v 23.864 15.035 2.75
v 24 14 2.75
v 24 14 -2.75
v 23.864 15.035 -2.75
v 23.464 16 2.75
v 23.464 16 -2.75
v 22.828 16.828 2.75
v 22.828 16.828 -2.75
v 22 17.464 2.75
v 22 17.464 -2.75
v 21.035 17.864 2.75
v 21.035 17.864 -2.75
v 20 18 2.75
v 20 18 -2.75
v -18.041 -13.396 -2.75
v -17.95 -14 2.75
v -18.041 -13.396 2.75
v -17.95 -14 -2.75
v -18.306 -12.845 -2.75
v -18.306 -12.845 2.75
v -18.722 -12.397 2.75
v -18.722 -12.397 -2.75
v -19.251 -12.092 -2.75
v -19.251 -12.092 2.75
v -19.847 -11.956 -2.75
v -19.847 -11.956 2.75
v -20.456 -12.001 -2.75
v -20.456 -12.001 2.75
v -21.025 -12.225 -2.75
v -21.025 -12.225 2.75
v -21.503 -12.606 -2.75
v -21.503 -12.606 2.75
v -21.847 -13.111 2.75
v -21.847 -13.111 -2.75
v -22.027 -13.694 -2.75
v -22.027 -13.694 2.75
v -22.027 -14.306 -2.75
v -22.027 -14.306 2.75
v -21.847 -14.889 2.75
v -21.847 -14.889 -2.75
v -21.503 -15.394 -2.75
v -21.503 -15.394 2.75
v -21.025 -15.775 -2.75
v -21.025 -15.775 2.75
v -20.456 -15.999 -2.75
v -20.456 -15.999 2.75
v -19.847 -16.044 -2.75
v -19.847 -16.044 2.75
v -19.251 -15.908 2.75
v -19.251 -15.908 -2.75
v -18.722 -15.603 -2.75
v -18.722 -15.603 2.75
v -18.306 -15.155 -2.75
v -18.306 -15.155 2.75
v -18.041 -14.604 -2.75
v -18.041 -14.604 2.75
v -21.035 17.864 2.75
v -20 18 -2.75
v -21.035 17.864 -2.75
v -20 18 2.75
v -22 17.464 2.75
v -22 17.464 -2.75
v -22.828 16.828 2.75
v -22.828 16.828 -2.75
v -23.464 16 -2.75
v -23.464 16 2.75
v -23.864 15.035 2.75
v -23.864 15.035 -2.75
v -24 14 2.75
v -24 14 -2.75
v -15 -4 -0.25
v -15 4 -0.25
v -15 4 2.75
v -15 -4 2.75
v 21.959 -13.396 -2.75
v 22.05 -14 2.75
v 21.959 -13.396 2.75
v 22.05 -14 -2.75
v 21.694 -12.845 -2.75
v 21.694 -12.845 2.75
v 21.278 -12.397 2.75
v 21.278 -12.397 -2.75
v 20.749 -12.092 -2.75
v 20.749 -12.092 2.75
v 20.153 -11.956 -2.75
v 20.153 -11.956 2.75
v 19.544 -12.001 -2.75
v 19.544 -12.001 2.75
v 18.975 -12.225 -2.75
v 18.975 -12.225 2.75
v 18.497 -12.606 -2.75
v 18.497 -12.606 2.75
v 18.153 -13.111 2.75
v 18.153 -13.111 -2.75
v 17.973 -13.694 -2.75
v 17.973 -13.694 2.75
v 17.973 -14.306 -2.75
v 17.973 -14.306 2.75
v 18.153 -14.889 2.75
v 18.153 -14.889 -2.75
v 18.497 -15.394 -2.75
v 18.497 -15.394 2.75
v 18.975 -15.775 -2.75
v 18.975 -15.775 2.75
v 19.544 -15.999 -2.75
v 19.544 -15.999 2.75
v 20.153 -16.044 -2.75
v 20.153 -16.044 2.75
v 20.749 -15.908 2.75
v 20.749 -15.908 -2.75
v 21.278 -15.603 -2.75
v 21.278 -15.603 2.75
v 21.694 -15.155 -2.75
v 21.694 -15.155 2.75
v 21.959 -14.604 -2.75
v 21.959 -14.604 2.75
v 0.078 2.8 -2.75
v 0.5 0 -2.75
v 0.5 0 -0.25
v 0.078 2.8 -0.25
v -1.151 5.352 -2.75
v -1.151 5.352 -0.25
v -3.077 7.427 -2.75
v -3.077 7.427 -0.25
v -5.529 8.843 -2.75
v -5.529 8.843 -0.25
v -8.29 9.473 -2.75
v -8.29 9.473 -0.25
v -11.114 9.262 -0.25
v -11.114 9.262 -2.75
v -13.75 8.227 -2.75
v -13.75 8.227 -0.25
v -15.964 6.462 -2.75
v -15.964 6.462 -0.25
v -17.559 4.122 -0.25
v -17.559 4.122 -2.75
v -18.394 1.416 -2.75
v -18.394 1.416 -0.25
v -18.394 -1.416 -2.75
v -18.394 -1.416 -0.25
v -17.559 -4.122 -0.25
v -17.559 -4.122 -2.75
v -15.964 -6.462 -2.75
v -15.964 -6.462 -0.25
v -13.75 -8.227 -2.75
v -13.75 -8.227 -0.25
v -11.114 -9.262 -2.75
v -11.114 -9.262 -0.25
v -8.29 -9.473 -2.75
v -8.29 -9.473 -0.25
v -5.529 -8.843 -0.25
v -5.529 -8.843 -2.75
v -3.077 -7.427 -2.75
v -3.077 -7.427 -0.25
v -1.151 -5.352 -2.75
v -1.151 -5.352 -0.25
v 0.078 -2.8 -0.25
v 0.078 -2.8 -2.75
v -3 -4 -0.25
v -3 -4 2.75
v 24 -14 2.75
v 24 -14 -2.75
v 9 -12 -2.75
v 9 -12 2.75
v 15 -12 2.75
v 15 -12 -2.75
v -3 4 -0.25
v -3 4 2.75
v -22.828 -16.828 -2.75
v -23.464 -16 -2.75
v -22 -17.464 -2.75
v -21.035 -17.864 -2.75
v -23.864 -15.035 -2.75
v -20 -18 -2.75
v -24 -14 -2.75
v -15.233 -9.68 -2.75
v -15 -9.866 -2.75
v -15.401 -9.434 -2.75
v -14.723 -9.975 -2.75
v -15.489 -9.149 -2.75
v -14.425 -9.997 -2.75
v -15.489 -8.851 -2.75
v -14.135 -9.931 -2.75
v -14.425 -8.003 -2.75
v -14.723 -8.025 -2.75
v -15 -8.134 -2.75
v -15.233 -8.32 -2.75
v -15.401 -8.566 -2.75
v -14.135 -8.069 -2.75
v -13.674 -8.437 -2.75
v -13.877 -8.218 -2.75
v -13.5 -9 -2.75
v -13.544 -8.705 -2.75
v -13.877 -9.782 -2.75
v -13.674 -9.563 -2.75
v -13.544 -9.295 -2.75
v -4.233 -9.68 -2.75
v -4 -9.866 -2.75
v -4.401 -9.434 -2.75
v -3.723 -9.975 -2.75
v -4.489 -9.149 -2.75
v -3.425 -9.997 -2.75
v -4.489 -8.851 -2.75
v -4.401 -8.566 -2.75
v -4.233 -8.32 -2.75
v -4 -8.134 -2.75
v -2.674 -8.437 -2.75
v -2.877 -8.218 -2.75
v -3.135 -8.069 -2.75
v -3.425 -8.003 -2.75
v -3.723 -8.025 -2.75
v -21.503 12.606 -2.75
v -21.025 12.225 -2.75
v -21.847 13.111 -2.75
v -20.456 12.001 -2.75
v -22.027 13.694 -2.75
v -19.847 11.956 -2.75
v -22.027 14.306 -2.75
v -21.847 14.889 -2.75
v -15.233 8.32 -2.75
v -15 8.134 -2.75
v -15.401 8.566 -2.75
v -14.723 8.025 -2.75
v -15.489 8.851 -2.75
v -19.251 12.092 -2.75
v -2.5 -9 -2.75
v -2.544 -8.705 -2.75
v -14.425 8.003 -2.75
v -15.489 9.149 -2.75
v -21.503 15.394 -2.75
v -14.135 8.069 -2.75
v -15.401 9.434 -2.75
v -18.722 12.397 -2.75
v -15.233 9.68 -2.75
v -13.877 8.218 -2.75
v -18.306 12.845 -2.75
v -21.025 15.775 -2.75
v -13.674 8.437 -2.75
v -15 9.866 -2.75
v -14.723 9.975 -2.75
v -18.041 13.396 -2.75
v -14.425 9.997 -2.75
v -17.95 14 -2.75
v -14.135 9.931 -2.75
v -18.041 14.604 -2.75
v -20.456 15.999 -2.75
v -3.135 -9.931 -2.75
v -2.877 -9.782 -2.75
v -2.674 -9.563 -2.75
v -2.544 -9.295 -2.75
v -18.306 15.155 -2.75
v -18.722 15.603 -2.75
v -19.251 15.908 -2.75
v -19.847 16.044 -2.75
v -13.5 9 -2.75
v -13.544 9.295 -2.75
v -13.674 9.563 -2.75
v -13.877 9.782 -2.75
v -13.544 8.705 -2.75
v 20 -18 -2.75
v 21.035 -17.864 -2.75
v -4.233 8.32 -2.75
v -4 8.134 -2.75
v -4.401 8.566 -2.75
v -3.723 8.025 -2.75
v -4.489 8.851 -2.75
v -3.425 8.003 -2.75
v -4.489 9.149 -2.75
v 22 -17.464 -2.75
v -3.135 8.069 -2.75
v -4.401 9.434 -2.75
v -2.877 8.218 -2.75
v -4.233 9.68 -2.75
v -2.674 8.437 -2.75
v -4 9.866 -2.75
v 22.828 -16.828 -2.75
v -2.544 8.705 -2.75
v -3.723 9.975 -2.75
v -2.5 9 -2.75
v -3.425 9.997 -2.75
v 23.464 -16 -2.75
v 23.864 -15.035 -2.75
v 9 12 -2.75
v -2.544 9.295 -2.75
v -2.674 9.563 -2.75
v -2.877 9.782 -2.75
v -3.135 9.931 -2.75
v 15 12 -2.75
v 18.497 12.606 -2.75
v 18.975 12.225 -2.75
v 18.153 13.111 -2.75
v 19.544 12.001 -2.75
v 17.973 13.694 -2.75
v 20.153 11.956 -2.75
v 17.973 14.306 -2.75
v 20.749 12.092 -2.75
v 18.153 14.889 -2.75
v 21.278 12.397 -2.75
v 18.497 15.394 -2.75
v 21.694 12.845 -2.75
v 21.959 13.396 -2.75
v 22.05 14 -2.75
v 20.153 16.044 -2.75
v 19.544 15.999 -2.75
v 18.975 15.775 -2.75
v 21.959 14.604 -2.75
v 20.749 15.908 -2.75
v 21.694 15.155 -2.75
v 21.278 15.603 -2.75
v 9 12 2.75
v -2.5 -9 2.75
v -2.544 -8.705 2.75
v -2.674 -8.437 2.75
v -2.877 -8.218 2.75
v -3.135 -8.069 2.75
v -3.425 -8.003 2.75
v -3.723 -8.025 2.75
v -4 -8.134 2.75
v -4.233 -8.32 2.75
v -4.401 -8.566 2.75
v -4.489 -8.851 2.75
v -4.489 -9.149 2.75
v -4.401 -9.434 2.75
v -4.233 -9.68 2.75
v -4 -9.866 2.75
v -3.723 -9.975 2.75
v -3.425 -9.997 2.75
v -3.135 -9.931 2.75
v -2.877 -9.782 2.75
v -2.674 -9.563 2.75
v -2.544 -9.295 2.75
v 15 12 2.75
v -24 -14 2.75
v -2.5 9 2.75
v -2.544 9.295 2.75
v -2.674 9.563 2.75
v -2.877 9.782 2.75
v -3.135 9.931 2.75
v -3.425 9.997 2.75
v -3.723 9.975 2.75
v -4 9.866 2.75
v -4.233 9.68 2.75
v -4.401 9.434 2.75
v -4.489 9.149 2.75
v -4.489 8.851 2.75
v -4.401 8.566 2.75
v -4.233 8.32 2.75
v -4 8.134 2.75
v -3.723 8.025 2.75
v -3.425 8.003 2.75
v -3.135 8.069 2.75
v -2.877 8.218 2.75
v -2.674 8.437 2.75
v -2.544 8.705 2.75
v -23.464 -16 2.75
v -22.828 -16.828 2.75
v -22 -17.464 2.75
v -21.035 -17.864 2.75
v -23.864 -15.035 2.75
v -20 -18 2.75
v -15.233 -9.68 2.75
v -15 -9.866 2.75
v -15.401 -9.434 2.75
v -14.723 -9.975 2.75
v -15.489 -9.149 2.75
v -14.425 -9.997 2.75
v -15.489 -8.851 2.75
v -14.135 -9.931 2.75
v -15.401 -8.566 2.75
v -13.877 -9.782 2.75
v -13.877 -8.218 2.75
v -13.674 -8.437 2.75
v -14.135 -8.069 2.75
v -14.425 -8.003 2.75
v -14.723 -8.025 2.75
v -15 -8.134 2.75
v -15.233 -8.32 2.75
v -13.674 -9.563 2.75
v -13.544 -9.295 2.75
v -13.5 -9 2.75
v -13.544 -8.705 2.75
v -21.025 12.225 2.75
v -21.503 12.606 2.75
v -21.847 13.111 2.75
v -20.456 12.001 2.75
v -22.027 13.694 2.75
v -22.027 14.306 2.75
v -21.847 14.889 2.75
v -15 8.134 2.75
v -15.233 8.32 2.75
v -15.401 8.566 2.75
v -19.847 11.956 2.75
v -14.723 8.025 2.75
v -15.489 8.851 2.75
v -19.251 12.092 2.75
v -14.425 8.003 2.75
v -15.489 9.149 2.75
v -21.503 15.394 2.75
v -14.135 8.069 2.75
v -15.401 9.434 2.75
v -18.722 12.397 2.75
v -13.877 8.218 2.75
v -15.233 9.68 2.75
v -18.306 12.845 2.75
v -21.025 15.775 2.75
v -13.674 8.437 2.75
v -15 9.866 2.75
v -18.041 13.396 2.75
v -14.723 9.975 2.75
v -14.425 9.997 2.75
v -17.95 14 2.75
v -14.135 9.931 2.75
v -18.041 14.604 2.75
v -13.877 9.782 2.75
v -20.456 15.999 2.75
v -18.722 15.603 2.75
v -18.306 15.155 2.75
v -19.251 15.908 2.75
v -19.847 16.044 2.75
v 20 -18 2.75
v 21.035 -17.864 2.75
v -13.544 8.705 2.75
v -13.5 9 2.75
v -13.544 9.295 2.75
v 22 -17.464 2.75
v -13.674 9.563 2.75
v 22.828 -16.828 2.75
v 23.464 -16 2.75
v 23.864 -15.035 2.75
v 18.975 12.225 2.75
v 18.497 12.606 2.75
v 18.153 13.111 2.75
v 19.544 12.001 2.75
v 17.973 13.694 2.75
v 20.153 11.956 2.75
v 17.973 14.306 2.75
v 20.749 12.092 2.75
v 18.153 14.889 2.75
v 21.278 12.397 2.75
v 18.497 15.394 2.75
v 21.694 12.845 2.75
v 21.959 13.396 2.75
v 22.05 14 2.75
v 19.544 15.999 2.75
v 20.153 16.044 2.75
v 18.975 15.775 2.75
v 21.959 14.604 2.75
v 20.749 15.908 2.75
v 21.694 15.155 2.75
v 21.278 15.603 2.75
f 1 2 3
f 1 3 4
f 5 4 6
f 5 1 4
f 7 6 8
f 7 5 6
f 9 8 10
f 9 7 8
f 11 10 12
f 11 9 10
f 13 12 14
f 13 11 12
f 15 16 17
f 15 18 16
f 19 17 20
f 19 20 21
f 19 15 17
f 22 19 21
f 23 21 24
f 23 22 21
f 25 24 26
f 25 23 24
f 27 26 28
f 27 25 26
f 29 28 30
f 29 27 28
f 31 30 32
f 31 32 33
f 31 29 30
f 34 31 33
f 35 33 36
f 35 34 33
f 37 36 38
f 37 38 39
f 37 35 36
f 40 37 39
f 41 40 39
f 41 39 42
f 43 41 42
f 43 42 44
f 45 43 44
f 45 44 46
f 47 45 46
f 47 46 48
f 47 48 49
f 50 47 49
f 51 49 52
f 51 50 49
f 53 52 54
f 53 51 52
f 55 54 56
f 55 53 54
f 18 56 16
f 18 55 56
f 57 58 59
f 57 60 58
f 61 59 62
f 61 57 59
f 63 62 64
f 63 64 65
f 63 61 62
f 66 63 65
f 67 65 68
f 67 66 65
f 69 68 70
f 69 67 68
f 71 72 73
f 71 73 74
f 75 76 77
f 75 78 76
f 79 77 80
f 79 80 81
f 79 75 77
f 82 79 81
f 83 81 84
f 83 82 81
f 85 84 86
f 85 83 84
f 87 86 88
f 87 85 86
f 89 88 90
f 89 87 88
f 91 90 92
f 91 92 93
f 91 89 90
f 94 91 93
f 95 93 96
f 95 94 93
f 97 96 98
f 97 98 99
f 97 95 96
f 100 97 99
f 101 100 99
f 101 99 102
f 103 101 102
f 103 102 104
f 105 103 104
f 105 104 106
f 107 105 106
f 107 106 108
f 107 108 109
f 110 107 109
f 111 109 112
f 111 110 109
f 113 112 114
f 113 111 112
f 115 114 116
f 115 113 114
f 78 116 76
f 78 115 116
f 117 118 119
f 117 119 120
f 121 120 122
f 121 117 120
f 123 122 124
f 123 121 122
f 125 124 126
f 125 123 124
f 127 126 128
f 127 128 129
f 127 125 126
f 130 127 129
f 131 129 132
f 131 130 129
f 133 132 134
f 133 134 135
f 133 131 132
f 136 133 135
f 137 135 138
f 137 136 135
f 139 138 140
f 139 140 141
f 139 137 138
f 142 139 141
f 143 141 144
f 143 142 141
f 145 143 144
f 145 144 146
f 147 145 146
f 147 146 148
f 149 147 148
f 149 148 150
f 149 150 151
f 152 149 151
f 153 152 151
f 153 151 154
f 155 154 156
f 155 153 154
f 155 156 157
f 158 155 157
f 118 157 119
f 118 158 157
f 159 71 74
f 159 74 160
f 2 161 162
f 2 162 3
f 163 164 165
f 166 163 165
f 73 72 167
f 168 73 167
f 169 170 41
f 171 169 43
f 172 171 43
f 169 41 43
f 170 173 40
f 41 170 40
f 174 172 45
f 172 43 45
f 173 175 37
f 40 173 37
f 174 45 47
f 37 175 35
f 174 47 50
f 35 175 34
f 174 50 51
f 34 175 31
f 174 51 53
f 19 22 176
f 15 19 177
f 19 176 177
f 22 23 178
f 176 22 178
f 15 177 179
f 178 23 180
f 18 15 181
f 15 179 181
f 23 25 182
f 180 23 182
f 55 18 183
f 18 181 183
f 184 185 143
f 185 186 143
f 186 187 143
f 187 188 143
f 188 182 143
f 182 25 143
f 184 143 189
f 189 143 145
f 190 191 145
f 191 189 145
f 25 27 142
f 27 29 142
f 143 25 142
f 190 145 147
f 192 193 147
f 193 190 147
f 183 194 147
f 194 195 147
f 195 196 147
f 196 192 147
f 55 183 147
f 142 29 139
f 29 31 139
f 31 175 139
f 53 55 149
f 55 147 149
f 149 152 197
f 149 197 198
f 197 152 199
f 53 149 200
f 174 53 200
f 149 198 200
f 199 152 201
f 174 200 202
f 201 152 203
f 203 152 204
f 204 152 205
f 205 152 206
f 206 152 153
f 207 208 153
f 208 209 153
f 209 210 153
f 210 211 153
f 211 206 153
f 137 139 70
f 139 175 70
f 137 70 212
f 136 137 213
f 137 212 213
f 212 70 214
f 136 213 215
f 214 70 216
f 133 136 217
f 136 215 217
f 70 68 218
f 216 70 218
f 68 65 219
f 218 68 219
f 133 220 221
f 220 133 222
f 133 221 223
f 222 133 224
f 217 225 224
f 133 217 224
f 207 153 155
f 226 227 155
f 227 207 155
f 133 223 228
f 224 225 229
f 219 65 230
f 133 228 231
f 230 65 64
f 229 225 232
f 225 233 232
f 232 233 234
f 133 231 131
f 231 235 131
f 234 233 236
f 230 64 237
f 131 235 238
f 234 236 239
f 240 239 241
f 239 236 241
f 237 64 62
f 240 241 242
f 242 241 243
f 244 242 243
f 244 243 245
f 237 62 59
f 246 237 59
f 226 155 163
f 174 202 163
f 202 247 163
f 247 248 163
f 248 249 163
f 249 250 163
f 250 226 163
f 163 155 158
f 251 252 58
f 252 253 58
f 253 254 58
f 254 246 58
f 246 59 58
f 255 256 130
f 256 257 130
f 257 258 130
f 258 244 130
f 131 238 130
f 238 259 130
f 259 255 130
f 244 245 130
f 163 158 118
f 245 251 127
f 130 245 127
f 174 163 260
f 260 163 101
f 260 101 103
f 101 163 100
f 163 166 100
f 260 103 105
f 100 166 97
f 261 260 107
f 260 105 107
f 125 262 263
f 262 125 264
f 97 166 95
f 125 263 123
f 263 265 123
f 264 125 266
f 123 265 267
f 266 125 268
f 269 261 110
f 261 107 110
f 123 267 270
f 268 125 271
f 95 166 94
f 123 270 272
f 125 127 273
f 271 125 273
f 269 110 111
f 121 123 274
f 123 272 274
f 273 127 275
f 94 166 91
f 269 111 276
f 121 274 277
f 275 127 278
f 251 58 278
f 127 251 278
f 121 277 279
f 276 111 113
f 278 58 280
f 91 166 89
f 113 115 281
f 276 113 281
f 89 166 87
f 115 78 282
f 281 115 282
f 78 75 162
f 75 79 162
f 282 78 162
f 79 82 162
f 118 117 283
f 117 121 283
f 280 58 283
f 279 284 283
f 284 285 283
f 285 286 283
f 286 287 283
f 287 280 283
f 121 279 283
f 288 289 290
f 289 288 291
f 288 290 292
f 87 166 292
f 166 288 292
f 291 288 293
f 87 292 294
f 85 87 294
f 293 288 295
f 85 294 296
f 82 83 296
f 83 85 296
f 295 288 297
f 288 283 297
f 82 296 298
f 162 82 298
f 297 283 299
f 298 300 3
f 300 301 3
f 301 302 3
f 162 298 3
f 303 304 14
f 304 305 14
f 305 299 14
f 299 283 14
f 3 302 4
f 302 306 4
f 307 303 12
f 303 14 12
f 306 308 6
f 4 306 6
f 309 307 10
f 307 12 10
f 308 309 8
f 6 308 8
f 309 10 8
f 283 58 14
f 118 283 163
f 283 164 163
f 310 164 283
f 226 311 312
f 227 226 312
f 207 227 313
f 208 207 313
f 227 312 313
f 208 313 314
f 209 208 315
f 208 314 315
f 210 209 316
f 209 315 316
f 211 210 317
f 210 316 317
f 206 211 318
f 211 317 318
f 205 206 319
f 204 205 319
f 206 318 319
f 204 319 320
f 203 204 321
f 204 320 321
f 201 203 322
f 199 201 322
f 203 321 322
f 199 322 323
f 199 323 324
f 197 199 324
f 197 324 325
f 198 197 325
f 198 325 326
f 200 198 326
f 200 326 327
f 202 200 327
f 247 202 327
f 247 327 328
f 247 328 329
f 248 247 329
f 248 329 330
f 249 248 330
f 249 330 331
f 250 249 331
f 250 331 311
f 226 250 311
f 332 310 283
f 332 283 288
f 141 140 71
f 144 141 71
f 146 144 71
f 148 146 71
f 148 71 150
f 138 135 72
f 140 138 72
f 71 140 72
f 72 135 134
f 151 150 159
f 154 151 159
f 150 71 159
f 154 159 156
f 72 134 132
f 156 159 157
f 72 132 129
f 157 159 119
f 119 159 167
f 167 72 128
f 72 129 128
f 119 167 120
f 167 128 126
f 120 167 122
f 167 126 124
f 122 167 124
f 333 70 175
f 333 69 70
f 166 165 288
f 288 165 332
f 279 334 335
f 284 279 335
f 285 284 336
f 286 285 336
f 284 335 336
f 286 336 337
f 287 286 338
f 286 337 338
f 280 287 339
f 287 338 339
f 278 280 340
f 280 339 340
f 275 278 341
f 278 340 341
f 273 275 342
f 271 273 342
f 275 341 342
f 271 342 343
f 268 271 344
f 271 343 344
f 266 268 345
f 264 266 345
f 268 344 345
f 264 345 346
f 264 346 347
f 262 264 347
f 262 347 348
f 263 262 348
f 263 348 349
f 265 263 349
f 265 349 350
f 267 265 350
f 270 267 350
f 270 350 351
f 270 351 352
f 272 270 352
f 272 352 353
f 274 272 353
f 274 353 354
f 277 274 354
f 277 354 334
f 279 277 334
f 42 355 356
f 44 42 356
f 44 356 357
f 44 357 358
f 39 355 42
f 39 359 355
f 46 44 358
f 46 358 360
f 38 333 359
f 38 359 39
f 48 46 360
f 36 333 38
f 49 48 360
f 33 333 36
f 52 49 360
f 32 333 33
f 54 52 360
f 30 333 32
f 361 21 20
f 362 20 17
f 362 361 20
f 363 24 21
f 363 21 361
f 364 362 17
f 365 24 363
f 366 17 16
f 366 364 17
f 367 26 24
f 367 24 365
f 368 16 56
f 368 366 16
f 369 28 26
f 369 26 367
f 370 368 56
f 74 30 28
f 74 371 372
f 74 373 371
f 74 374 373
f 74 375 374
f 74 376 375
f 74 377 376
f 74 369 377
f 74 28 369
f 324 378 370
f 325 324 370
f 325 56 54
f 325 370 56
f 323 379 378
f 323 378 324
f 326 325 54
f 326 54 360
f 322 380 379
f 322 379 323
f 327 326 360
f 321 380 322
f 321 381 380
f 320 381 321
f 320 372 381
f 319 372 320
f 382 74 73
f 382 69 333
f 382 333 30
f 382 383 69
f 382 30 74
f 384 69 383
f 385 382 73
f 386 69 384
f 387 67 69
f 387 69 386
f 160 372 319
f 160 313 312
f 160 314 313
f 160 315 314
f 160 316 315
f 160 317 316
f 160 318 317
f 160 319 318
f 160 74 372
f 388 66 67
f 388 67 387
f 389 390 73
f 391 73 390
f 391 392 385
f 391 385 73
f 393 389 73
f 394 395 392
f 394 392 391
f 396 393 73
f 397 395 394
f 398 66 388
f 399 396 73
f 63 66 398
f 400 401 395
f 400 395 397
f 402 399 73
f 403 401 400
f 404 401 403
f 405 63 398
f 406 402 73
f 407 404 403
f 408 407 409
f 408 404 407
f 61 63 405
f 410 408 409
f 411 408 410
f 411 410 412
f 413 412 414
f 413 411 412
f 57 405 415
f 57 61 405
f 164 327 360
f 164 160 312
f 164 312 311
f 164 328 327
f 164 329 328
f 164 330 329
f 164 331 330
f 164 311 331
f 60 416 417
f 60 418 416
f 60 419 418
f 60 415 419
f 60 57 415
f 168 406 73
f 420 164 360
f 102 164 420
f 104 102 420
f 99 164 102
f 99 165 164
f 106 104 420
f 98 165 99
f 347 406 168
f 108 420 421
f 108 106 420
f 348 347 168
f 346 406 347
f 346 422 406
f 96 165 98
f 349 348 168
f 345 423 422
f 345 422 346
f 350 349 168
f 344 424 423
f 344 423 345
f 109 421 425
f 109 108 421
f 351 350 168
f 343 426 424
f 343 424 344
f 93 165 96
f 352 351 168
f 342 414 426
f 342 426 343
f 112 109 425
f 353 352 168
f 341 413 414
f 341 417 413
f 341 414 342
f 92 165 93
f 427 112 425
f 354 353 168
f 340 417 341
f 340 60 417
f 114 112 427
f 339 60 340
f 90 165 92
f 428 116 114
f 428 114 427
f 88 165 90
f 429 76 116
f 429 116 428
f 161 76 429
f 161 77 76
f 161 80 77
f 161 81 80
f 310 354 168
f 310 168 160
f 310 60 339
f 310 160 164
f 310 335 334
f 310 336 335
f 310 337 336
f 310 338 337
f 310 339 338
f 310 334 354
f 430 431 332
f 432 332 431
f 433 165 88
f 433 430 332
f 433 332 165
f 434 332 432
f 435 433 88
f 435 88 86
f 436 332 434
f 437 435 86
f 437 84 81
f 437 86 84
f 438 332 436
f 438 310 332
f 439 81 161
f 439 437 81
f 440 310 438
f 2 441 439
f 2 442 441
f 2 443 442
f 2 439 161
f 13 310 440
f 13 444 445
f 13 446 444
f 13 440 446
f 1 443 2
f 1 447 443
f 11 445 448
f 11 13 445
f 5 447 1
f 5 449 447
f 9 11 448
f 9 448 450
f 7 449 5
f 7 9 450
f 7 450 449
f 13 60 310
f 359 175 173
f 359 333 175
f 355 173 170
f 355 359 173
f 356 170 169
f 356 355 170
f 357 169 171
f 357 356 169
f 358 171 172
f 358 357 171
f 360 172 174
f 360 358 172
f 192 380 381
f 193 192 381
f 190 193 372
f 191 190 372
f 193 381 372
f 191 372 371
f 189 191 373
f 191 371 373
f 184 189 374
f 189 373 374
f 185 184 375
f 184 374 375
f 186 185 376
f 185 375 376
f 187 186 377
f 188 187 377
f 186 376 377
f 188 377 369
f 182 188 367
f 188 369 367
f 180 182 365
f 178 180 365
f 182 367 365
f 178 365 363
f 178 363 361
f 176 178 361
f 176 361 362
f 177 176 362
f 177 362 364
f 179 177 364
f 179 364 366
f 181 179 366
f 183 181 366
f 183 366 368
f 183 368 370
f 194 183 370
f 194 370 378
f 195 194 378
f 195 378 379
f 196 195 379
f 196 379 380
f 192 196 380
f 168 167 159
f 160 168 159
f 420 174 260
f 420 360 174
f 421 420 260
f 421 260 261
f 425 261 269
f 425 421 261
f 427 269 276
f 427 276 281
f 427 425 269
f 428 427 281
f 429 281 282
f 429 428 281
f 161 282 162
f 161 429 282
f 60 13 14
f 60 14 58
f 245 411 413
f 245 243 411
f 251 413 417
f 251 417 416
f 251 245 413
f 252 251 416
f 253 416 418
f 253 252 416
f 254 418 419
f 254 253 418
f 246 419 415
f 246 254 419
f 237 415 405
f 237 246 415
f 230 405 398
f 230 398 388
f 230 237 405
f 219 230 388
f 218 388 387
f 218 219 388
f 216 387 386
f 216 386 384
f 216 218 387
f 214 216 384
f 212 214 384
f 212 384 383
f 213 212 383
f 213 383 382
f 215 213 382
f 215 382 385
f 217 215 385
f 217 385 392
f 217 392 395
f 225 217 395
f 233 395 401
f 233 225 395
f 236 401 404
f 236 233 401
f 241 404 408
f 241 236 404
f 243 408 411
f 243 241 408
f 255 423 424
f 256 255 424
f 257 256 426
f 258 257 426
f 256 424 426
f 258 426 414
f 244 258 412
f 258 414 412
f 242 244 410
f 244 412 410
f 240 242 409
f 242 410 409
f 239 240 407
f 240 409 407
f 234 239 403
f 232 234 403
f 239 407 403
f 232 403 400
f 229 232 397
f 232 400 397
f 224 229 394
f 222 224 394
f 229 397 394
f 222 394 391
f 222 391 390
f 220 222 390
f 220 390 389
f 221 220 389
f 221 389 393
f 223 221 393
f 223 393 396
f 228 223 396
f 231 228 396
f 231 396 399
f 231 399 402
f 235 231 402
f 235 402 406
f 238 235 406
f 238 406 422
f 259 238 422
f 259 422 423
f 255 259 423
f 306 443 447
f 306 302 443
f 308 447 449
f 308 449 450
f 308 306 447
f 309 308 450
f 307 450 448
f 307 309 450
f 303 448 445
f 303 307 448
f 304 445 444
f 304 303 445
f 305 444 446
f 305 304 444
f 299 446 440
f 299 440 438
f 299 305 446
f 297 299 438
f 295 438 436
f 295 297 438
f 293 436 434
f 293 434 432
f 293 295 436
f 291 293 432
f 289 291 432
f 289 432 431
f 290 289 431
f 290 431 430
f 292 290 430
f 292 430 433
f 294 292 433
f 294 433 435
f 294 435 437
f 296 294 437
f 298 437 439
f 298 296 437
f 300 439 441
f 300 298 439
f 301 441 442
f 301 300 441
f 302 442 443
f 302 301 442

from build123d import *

# Parameters (mm, degrees)
SKETCH1_R           = 2.05
BOSS_EXTRUDE1_DEPTH = 2.75
SKETCH2_R           = 9.5
CUT_EXTRUDE1_DEPTH  = 2.5
SKETCH3_W           = 12
SKETCH3_H           = 8
CUT_EXTRUDE2_DEPTH  = 31.149626863
SKETCH4_R           = 1
CUT_EXTRUDE3_DEPTH  = 31.5
SKETCH5_W           = 6
SKETCH5_H           = 24
CUT_EXTRUDE4_DEPTH  = 31.5


with BuildPart() as part:
    # Sketch1 → Boss-Extrude1 (new, symmetric)
    with BuildSketch(Plane.XY):
        with BuildLine():
            Line((-20, -18), (20, -18))
            ThreePointArc((20, -18), (22.828427125, -16.828427125), (24, -14))
            Line((24, -14), (24, 14))
            ThreePointArc((24, 14), (22.828427125, 16.828427125), (20, 18))
            Line((20, 18), (-20, 18))
            ThreePointArc((-20, 18), (-22.828427125, 16.828427125), (-24, 14))
            Line((-24, 14), (-24, -14))
            ThreePointArc((-24, -14), (-22.828427125, -16.828427125), (-20, -18))
        make_face()
        with Locations((-20, -14)):
            Circle(SKETCH1_R, mode=Mode.SUBTRACT)
        with Locations((-20, 14)):
            Circle(SKETCH1_R, mode=Mode.SUBTRACT)
        with Locations((20, 14)):
            Circle(SKETCH1_R, mode=Mode.SUBTRACT)
        with Locations((20, -14)):
            Circle(SKETCH1_R, mode=Mode.SUBTRACT)
    extrude(amount=BOSS_EXTRUDE1_DEPTH, both=True)

    # Sketch2 → Cut-Extrude1 (cut)
    with BuildSketch(Plane.XY.offset(-2.75)):
        with Locations((-9, 0)):
            Circle(SKETCH2_R)
    extrude(amount=CUT_EXTRUDE1_DEPTH, mode=Mode.SUBTRACT)

    # Sketch3 → Cut-Extrude2 (cut, through all)
    with BuildSketch(Plane(origin=(0, 0, -0.25), x_dir=(1, 0, 0), z_dir=(0, 0, -1))):
        with Locations((-9, 0)):
            Rectangle(SKETCH3_W, SKETCH3_H)
    extrude(amount=-CUT_EXTRUDE2_DEPTH, mode=Mode.SUBTRACT)

    # Sketch4 → Cut-Extrude3 (cut, through all)
    with BuildSketch(Plane.XY.offset(2.75)):
        with Locations((-14.5, 9)):
            Circle(SKETCH4_R)
        with Locations((-3.5, 9)):
            Circle(SKETCH4_R)
        with Locations((-3.5, -9)):
            Circle(SKETCH4_R)
        with Locations((-14.5, -9)):
            Circle(SKETCH4_R)
    extrude(amount=-CUT_EXTRUDE3_DEPTH, mode=Mode.SUBTRACT)

    # Sketch5 → Cut-Extrude4 (cut, through all)
    with BuildSketch(Plane.XY.offset(2.75)):
        with Locations((12, 0)):
            Rectangle(SKETCH5_W, SKETCH5_H)
    extrude(amount=-CUT_EXTRUDE4_DEPTH, mode=Mode.SUBTRACT)


solid = part.part
